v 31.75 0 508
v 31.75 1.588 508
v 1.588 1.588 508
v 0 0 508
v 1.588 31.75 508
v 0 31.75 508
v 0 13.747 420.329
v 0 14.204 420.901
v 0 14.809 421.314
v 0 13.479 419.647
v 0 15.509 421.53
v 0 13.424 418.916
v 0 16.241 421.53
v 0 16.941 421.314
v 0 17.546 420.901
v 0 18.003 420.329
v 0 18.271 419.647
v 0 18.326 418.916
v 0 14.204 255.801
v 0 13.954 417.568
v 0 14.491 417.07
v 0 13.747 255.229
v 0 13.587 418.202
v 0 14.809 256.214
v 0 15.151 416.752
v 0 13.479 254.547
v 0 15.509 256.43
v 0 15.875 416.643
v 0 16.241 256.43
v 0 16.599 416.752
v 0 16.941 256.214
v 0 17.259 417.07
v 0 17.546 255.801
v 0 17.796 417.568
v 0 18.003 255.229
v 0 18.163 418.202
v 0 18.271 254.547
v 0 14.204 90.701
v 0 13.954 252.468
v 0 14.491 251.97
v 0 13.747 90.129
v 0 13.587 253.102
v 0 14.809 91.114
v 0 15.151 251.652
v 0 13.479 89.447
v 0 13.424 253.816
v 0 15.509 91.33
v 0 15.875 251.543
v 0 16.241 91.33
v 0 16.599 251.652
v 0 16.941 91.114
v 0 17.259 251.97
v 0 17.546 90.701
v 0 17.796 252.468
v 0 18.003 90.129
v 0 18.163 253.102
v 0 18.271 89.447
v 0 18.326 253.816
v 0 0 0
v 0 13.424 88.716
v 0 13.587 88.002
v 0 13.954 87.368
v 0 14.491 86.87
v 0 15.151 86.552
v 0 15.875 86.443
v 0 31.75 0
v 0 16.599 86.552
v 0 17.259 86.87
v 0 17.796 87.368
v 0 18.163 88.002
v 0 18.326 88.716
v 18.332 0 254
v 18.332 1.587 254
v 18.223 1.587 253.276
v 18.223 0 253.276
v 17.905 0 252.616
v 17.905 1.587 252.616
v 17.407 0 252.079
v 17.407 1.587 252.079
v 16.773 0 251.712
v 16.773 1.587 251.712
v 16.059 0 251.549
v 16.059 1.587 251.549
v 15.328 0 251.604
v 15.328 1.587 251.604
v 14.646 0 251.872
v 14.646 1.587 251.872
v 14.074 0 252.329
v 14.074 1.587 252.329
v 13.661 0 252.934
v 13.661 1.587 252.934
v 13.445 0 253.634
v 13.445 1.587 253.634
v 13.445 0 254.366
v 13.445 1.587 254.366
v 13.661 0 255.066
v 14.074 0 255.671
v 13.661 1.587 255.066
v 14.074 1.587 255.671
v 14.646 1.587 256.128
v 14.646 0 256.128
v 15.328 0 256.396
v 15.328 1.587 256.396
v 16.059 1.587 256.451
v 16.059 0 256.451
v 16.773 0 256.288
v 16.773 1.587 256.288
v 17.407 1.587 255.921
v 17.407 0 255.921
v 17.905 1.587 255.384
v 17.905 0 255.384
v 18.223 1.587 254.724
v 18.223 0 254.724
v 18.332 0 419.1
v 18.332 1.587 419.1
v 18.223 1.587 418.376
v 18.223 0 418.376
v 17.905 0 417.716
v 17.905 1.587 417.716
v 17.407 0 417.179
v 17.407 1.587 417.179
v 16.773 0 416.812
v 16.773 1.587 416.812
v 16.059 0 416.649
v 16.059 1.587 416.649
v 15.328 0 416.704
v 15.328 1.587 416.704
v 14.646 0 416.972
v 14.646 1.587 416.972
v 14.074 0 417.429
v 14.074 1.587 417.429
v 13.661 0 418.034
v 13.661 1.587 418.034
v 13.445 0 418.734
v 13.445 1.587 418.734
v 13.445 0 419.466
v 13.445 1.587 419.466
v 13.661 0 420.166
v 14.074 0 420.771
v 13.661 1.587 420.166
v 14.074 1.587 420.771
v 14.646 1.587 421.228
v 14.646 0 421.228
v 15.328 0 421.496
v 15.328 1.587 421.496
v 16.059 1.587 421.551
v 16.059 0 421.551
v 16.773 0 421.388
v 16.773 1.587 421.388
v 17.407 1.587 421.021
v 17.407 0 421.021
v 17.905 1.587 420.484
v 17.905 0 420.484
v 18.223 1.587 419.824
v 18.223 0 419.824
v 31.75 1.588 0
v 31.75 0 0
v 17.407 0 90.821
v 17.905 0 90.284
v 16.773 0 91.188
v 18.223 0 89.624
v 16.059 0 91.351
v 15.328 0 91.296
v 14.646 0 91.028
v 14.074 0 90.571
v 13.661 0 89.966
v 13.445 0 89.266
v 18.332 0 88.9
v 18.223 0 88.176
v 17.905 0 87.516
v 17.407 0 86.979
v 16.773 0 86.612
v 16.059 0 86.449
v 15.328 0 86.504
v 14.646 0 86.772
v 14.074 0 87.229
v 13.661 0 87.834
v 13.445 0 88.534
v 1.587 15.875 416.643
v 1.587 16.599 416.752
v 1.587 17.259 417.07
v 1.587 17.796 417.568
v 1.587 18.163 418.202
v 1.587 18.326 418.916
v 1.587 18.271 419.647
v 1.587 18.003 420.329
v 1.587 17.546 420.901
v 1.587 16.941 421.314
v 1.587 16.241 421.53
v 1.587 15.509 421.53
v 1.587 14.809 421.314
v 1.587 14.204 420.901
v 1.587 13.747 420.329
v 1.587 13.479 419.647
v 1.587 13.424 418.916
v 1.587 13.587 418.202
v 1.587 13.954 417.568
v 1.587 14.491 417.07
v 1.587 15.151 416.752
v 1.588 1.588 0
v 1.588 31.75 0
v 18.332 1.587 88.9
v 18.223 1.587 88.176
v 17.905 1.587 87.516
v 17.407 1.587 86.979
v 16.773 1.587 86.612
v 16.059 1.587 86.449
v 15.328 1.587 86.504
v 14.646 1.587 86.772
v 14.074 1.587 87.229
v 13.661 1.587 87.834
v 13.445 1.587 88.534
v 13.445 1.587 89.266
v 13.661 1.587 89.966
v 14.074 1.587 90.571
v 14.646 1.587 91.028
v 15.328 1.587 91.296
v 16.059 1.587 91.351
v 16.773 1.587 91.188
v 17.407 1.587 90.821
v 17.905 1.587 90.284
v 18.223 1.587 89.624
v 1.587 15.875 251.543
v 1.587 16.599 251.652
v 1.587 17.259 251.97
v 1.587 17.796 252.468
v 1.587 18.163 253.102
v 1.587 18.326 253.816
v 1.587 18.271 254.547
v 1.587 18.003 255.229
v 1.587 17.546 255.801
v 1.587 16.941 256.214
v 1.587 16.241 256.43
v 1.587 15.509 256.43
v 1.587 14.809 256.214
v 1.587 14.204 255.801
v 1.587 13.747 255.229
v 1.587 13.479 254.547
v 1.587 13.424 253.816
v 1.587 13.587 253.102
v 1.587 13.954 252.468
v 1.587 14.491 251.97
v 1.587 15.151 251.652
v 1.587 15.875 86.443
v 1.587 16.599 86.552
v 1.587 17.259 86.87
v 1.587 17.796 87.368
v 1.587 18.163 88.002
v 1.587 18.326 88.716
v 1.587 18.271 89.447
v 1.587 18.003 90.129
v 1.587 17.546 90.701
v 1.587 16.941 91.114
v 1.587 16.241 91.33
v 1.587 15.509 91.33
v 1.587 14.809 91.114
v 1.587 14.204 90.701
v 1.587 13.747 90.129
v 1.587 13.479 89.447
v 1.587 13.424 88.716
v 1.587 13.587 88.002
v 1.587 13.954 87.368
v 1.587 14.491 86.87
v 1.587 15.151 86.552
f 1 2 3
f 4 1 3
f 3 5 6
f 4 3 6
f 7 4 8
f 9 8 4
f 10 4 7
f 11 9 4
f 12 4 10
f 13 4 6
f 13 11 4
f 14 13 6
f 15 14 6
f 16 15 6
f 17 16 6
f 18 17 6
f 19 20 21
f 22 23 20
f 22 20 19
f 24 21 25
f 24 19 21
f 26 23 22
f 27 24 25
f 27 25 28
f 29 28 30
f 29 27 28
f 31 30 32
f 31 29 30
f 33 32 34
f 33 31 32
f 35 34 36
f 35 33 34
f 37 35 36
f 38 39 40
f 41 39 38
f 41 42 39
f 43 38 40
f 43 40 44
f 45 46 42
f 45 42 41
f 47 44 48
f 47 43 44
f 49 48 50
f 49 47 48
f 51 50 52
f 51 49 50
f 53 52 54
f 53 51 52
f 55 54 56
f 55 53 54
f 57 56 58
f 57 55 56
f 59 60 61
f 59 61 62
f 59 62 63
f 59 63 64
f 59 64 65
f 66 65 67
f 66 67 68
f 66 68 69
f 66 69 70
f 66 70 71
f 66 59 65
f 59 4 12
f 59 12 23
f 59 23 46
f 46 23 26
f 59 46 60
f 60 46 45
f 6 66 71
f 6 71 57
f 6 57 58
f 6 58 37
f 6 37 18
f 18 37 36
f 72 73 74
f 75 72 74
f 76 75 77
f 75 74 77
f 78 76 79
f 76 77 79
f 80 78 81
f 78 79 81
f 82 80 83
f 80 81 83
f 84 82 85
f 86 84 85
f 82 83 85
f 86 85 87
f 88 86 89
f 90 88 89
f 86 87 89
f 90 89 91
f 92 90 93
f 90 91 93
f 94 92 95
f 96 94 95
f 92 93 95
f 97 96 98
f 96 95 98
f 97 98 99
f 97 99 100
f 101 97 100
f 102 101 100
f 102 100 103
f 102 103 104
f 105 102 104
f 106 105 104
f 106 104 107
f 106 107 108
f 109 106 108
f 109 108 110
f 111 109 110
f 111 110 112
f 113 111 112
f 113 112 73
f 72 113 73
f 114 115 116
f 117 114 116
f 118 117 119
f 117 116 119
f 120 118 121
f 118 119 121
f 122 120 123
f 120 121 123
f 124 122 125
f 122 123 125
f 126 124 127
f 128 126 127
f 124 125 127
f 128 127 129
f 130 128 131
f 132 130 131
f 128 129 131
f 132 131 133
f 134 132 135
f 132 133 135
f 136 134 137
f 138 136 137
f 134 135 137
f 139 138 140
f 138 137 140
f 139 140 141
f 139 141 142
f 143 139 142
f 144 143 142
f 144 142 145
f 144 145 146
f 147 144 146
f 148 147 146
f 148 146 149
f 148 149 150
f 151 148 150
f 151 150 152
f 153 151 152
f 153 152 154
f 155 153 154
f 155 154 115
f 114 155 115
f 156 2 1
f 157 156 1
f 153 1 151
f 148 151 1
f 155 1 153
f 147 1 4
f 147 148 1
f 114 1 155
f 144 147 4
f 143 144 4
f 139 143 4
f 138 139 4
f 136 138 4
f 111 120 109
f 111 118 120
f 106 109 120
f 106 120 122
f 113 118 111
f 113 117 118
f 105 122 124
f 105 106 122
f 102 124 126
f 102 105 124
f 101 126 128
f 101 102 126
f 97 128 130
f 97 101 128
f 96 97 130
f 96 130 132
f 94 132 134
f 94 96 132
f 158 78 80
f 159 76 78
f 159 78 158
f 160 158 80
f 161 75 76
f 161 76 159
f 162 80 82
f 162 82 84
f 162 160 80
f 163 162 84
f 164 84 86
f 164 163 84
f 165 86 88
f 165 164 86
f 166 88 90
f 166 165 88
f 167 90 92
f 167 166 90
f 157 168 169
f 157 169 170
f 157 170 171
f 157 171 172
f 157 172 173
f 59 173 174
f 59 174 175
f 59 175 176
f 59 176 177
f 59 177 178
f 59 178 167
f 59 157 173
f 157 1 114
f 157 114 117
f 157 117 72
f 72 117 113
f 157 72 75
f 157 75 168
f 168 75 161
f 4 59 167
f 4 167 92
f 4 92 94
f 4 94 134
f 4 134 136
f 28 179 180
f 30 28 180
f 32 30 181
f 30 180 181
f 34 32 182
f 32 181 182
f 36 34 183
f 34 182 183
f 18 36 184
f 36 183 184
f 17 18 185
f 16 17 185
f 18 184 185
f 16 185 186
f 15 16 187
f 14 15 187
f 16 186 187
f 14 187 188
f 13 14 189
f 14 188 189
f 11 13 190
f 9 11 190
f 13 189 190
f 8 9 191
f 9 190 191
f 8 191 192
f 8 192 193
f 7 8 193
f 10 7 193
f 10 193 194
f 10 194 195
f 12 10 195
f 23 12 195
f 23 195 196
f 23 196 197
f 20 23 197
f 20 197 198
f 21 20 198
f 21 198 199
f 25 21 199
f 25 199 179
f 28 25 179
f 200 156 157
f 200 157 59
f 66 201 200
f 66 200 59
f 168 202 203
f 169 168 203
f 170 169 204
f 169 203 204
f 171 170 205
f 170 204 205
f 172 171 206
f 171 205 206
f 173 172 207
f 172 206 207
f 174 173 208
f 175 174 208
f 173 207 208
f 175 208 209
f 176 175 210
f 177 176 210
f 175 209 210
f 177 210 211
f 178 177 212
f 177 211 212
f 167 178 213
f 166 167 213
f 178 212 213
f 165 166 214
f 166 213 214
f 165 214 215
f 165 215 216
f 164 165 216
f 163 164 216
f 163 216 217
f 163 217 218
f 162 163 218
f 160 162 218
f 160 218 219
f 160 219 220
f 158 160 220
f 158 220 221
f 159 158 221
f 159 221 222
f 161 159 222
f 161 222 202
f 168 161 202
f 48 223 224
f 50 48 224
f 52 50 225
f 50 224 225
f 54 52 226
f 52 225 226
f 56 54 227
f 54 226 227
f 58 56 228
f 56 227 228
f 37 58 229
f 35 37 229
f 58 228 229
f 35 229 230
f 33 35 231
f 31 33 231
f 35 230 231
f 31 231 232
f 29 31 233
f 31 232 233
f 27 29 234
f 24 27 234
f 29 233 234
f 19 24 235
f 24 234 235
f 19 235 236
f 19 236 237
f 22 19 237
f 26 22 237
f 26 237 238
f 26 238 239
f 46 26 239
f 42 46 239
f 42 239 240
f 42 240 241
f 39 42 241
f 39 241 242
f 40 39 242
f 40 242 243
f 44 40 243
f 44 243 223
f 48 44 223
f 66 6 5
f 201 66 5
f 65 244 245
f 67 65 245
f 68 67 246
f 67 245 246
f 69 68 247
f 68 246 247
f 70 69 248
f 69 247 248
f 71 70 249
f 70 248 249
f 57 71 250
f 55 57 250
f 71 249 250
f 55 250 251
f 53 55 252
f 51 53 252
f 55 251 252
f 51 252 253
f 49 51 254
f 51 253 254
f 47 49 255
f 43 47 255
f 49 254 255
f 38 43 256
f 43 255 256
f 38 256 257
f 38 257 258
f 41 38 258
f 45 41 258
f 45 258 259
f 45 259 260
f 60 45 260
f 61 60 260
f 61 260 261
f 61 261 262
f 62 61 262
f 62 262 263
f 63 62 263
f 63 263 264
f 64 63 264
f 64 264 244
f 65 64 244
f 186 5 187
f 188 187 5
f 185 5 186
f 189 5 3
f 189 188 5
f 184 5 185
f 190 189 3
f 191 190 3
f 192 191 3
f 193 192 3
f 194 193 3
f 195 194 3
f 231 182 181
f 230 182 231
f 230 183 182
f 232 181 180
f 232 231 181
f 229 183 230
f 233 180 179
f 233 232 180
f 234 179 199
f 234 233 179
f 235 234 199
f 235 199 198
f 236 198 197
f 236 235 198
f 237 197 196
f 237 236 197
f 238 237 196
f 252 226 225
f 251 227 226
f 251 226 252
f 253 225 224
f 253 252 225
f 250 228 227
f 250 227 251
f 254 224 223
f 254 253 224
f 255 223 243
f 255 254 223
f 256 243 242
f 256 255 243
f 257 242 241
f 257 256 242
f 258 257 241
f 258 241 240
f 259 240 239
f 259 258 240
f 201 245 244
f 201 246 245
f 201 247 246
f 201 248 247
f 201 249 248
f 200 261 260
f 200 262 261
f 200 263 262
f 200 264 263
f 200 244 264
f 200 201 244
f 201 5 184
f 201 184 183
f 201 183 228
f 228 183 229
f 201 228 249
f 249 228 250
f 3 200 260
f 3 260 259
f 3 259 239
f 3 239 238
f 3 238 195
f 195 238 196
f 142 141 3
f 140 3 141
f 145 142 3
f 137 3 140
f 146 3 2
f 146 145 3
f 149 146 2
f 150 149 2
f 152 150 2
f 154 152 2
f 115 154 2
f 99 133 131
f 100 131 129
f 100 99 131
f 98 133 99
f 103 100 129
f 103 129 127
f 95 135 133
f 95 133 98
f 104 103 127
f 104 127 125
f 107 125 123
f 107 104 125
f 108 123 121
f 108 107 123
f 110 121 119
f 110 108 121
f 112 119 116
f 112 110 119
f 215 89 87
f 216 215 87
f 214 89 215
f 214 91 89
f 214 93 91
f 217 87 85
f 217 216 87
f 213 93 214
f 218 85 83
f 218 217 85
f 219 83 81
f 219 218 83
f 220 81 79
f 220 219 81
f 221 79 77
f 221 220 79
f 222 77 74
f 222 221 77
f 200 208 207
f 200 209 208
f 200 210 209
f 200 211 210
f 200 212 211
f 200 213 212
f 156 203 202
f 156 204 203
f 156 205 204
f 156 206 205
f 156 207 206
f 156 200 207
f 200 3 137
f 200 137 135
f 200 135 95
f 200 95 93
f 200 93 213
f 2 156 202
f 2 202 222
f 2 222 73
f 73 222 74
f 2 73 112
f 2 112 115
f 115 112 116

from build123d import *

# Parameters (mm, degrees)
BOSS_EXTRUDE1_DEPTH          = 508
F_10_0_1935_DIAMETER_HOLE2_D = 4.9149
F_10_0_1935_DIAMETER_HOLE4_D = 4.9149


with BuildPart() as part:
    # Sketch2 → Boss-Extrude1 (new body)
    with BuildSketch(Plane.XY):
        Polygon((0, 0), (0, 31.75), (1.5875, 31.75), (1.5875, 1.5875), (31.75, 1.5875), (31.75, 0), align=None)
    extrude(amount=BOSS_EXTRUDE1_DEPTH)

    # #10 (0.1935) Diameter Hole2 (through all)
    with Locations(Plane.ZY):
        with Locations((419.1, 15.875), (88.9, 15.875), (254, 15.875)):
            Hole(F_10_0_1935_DIAMETER_HOLE2_D / 2)

    # #10 (0.1935) Diameter Hole4 (through all)
    with Locations(Plane(origin=(0, 0, 0), x_dir=(-1, 0, 0), z_dir=(0, -1, 0))):
        with Locations((-15.875, -419.1), (-15.875, -254), (-15.875, -88.9)):
            Hole(F_10_0_1935_DIAMETER_HOLE4_D / 2)


solid = part.part
